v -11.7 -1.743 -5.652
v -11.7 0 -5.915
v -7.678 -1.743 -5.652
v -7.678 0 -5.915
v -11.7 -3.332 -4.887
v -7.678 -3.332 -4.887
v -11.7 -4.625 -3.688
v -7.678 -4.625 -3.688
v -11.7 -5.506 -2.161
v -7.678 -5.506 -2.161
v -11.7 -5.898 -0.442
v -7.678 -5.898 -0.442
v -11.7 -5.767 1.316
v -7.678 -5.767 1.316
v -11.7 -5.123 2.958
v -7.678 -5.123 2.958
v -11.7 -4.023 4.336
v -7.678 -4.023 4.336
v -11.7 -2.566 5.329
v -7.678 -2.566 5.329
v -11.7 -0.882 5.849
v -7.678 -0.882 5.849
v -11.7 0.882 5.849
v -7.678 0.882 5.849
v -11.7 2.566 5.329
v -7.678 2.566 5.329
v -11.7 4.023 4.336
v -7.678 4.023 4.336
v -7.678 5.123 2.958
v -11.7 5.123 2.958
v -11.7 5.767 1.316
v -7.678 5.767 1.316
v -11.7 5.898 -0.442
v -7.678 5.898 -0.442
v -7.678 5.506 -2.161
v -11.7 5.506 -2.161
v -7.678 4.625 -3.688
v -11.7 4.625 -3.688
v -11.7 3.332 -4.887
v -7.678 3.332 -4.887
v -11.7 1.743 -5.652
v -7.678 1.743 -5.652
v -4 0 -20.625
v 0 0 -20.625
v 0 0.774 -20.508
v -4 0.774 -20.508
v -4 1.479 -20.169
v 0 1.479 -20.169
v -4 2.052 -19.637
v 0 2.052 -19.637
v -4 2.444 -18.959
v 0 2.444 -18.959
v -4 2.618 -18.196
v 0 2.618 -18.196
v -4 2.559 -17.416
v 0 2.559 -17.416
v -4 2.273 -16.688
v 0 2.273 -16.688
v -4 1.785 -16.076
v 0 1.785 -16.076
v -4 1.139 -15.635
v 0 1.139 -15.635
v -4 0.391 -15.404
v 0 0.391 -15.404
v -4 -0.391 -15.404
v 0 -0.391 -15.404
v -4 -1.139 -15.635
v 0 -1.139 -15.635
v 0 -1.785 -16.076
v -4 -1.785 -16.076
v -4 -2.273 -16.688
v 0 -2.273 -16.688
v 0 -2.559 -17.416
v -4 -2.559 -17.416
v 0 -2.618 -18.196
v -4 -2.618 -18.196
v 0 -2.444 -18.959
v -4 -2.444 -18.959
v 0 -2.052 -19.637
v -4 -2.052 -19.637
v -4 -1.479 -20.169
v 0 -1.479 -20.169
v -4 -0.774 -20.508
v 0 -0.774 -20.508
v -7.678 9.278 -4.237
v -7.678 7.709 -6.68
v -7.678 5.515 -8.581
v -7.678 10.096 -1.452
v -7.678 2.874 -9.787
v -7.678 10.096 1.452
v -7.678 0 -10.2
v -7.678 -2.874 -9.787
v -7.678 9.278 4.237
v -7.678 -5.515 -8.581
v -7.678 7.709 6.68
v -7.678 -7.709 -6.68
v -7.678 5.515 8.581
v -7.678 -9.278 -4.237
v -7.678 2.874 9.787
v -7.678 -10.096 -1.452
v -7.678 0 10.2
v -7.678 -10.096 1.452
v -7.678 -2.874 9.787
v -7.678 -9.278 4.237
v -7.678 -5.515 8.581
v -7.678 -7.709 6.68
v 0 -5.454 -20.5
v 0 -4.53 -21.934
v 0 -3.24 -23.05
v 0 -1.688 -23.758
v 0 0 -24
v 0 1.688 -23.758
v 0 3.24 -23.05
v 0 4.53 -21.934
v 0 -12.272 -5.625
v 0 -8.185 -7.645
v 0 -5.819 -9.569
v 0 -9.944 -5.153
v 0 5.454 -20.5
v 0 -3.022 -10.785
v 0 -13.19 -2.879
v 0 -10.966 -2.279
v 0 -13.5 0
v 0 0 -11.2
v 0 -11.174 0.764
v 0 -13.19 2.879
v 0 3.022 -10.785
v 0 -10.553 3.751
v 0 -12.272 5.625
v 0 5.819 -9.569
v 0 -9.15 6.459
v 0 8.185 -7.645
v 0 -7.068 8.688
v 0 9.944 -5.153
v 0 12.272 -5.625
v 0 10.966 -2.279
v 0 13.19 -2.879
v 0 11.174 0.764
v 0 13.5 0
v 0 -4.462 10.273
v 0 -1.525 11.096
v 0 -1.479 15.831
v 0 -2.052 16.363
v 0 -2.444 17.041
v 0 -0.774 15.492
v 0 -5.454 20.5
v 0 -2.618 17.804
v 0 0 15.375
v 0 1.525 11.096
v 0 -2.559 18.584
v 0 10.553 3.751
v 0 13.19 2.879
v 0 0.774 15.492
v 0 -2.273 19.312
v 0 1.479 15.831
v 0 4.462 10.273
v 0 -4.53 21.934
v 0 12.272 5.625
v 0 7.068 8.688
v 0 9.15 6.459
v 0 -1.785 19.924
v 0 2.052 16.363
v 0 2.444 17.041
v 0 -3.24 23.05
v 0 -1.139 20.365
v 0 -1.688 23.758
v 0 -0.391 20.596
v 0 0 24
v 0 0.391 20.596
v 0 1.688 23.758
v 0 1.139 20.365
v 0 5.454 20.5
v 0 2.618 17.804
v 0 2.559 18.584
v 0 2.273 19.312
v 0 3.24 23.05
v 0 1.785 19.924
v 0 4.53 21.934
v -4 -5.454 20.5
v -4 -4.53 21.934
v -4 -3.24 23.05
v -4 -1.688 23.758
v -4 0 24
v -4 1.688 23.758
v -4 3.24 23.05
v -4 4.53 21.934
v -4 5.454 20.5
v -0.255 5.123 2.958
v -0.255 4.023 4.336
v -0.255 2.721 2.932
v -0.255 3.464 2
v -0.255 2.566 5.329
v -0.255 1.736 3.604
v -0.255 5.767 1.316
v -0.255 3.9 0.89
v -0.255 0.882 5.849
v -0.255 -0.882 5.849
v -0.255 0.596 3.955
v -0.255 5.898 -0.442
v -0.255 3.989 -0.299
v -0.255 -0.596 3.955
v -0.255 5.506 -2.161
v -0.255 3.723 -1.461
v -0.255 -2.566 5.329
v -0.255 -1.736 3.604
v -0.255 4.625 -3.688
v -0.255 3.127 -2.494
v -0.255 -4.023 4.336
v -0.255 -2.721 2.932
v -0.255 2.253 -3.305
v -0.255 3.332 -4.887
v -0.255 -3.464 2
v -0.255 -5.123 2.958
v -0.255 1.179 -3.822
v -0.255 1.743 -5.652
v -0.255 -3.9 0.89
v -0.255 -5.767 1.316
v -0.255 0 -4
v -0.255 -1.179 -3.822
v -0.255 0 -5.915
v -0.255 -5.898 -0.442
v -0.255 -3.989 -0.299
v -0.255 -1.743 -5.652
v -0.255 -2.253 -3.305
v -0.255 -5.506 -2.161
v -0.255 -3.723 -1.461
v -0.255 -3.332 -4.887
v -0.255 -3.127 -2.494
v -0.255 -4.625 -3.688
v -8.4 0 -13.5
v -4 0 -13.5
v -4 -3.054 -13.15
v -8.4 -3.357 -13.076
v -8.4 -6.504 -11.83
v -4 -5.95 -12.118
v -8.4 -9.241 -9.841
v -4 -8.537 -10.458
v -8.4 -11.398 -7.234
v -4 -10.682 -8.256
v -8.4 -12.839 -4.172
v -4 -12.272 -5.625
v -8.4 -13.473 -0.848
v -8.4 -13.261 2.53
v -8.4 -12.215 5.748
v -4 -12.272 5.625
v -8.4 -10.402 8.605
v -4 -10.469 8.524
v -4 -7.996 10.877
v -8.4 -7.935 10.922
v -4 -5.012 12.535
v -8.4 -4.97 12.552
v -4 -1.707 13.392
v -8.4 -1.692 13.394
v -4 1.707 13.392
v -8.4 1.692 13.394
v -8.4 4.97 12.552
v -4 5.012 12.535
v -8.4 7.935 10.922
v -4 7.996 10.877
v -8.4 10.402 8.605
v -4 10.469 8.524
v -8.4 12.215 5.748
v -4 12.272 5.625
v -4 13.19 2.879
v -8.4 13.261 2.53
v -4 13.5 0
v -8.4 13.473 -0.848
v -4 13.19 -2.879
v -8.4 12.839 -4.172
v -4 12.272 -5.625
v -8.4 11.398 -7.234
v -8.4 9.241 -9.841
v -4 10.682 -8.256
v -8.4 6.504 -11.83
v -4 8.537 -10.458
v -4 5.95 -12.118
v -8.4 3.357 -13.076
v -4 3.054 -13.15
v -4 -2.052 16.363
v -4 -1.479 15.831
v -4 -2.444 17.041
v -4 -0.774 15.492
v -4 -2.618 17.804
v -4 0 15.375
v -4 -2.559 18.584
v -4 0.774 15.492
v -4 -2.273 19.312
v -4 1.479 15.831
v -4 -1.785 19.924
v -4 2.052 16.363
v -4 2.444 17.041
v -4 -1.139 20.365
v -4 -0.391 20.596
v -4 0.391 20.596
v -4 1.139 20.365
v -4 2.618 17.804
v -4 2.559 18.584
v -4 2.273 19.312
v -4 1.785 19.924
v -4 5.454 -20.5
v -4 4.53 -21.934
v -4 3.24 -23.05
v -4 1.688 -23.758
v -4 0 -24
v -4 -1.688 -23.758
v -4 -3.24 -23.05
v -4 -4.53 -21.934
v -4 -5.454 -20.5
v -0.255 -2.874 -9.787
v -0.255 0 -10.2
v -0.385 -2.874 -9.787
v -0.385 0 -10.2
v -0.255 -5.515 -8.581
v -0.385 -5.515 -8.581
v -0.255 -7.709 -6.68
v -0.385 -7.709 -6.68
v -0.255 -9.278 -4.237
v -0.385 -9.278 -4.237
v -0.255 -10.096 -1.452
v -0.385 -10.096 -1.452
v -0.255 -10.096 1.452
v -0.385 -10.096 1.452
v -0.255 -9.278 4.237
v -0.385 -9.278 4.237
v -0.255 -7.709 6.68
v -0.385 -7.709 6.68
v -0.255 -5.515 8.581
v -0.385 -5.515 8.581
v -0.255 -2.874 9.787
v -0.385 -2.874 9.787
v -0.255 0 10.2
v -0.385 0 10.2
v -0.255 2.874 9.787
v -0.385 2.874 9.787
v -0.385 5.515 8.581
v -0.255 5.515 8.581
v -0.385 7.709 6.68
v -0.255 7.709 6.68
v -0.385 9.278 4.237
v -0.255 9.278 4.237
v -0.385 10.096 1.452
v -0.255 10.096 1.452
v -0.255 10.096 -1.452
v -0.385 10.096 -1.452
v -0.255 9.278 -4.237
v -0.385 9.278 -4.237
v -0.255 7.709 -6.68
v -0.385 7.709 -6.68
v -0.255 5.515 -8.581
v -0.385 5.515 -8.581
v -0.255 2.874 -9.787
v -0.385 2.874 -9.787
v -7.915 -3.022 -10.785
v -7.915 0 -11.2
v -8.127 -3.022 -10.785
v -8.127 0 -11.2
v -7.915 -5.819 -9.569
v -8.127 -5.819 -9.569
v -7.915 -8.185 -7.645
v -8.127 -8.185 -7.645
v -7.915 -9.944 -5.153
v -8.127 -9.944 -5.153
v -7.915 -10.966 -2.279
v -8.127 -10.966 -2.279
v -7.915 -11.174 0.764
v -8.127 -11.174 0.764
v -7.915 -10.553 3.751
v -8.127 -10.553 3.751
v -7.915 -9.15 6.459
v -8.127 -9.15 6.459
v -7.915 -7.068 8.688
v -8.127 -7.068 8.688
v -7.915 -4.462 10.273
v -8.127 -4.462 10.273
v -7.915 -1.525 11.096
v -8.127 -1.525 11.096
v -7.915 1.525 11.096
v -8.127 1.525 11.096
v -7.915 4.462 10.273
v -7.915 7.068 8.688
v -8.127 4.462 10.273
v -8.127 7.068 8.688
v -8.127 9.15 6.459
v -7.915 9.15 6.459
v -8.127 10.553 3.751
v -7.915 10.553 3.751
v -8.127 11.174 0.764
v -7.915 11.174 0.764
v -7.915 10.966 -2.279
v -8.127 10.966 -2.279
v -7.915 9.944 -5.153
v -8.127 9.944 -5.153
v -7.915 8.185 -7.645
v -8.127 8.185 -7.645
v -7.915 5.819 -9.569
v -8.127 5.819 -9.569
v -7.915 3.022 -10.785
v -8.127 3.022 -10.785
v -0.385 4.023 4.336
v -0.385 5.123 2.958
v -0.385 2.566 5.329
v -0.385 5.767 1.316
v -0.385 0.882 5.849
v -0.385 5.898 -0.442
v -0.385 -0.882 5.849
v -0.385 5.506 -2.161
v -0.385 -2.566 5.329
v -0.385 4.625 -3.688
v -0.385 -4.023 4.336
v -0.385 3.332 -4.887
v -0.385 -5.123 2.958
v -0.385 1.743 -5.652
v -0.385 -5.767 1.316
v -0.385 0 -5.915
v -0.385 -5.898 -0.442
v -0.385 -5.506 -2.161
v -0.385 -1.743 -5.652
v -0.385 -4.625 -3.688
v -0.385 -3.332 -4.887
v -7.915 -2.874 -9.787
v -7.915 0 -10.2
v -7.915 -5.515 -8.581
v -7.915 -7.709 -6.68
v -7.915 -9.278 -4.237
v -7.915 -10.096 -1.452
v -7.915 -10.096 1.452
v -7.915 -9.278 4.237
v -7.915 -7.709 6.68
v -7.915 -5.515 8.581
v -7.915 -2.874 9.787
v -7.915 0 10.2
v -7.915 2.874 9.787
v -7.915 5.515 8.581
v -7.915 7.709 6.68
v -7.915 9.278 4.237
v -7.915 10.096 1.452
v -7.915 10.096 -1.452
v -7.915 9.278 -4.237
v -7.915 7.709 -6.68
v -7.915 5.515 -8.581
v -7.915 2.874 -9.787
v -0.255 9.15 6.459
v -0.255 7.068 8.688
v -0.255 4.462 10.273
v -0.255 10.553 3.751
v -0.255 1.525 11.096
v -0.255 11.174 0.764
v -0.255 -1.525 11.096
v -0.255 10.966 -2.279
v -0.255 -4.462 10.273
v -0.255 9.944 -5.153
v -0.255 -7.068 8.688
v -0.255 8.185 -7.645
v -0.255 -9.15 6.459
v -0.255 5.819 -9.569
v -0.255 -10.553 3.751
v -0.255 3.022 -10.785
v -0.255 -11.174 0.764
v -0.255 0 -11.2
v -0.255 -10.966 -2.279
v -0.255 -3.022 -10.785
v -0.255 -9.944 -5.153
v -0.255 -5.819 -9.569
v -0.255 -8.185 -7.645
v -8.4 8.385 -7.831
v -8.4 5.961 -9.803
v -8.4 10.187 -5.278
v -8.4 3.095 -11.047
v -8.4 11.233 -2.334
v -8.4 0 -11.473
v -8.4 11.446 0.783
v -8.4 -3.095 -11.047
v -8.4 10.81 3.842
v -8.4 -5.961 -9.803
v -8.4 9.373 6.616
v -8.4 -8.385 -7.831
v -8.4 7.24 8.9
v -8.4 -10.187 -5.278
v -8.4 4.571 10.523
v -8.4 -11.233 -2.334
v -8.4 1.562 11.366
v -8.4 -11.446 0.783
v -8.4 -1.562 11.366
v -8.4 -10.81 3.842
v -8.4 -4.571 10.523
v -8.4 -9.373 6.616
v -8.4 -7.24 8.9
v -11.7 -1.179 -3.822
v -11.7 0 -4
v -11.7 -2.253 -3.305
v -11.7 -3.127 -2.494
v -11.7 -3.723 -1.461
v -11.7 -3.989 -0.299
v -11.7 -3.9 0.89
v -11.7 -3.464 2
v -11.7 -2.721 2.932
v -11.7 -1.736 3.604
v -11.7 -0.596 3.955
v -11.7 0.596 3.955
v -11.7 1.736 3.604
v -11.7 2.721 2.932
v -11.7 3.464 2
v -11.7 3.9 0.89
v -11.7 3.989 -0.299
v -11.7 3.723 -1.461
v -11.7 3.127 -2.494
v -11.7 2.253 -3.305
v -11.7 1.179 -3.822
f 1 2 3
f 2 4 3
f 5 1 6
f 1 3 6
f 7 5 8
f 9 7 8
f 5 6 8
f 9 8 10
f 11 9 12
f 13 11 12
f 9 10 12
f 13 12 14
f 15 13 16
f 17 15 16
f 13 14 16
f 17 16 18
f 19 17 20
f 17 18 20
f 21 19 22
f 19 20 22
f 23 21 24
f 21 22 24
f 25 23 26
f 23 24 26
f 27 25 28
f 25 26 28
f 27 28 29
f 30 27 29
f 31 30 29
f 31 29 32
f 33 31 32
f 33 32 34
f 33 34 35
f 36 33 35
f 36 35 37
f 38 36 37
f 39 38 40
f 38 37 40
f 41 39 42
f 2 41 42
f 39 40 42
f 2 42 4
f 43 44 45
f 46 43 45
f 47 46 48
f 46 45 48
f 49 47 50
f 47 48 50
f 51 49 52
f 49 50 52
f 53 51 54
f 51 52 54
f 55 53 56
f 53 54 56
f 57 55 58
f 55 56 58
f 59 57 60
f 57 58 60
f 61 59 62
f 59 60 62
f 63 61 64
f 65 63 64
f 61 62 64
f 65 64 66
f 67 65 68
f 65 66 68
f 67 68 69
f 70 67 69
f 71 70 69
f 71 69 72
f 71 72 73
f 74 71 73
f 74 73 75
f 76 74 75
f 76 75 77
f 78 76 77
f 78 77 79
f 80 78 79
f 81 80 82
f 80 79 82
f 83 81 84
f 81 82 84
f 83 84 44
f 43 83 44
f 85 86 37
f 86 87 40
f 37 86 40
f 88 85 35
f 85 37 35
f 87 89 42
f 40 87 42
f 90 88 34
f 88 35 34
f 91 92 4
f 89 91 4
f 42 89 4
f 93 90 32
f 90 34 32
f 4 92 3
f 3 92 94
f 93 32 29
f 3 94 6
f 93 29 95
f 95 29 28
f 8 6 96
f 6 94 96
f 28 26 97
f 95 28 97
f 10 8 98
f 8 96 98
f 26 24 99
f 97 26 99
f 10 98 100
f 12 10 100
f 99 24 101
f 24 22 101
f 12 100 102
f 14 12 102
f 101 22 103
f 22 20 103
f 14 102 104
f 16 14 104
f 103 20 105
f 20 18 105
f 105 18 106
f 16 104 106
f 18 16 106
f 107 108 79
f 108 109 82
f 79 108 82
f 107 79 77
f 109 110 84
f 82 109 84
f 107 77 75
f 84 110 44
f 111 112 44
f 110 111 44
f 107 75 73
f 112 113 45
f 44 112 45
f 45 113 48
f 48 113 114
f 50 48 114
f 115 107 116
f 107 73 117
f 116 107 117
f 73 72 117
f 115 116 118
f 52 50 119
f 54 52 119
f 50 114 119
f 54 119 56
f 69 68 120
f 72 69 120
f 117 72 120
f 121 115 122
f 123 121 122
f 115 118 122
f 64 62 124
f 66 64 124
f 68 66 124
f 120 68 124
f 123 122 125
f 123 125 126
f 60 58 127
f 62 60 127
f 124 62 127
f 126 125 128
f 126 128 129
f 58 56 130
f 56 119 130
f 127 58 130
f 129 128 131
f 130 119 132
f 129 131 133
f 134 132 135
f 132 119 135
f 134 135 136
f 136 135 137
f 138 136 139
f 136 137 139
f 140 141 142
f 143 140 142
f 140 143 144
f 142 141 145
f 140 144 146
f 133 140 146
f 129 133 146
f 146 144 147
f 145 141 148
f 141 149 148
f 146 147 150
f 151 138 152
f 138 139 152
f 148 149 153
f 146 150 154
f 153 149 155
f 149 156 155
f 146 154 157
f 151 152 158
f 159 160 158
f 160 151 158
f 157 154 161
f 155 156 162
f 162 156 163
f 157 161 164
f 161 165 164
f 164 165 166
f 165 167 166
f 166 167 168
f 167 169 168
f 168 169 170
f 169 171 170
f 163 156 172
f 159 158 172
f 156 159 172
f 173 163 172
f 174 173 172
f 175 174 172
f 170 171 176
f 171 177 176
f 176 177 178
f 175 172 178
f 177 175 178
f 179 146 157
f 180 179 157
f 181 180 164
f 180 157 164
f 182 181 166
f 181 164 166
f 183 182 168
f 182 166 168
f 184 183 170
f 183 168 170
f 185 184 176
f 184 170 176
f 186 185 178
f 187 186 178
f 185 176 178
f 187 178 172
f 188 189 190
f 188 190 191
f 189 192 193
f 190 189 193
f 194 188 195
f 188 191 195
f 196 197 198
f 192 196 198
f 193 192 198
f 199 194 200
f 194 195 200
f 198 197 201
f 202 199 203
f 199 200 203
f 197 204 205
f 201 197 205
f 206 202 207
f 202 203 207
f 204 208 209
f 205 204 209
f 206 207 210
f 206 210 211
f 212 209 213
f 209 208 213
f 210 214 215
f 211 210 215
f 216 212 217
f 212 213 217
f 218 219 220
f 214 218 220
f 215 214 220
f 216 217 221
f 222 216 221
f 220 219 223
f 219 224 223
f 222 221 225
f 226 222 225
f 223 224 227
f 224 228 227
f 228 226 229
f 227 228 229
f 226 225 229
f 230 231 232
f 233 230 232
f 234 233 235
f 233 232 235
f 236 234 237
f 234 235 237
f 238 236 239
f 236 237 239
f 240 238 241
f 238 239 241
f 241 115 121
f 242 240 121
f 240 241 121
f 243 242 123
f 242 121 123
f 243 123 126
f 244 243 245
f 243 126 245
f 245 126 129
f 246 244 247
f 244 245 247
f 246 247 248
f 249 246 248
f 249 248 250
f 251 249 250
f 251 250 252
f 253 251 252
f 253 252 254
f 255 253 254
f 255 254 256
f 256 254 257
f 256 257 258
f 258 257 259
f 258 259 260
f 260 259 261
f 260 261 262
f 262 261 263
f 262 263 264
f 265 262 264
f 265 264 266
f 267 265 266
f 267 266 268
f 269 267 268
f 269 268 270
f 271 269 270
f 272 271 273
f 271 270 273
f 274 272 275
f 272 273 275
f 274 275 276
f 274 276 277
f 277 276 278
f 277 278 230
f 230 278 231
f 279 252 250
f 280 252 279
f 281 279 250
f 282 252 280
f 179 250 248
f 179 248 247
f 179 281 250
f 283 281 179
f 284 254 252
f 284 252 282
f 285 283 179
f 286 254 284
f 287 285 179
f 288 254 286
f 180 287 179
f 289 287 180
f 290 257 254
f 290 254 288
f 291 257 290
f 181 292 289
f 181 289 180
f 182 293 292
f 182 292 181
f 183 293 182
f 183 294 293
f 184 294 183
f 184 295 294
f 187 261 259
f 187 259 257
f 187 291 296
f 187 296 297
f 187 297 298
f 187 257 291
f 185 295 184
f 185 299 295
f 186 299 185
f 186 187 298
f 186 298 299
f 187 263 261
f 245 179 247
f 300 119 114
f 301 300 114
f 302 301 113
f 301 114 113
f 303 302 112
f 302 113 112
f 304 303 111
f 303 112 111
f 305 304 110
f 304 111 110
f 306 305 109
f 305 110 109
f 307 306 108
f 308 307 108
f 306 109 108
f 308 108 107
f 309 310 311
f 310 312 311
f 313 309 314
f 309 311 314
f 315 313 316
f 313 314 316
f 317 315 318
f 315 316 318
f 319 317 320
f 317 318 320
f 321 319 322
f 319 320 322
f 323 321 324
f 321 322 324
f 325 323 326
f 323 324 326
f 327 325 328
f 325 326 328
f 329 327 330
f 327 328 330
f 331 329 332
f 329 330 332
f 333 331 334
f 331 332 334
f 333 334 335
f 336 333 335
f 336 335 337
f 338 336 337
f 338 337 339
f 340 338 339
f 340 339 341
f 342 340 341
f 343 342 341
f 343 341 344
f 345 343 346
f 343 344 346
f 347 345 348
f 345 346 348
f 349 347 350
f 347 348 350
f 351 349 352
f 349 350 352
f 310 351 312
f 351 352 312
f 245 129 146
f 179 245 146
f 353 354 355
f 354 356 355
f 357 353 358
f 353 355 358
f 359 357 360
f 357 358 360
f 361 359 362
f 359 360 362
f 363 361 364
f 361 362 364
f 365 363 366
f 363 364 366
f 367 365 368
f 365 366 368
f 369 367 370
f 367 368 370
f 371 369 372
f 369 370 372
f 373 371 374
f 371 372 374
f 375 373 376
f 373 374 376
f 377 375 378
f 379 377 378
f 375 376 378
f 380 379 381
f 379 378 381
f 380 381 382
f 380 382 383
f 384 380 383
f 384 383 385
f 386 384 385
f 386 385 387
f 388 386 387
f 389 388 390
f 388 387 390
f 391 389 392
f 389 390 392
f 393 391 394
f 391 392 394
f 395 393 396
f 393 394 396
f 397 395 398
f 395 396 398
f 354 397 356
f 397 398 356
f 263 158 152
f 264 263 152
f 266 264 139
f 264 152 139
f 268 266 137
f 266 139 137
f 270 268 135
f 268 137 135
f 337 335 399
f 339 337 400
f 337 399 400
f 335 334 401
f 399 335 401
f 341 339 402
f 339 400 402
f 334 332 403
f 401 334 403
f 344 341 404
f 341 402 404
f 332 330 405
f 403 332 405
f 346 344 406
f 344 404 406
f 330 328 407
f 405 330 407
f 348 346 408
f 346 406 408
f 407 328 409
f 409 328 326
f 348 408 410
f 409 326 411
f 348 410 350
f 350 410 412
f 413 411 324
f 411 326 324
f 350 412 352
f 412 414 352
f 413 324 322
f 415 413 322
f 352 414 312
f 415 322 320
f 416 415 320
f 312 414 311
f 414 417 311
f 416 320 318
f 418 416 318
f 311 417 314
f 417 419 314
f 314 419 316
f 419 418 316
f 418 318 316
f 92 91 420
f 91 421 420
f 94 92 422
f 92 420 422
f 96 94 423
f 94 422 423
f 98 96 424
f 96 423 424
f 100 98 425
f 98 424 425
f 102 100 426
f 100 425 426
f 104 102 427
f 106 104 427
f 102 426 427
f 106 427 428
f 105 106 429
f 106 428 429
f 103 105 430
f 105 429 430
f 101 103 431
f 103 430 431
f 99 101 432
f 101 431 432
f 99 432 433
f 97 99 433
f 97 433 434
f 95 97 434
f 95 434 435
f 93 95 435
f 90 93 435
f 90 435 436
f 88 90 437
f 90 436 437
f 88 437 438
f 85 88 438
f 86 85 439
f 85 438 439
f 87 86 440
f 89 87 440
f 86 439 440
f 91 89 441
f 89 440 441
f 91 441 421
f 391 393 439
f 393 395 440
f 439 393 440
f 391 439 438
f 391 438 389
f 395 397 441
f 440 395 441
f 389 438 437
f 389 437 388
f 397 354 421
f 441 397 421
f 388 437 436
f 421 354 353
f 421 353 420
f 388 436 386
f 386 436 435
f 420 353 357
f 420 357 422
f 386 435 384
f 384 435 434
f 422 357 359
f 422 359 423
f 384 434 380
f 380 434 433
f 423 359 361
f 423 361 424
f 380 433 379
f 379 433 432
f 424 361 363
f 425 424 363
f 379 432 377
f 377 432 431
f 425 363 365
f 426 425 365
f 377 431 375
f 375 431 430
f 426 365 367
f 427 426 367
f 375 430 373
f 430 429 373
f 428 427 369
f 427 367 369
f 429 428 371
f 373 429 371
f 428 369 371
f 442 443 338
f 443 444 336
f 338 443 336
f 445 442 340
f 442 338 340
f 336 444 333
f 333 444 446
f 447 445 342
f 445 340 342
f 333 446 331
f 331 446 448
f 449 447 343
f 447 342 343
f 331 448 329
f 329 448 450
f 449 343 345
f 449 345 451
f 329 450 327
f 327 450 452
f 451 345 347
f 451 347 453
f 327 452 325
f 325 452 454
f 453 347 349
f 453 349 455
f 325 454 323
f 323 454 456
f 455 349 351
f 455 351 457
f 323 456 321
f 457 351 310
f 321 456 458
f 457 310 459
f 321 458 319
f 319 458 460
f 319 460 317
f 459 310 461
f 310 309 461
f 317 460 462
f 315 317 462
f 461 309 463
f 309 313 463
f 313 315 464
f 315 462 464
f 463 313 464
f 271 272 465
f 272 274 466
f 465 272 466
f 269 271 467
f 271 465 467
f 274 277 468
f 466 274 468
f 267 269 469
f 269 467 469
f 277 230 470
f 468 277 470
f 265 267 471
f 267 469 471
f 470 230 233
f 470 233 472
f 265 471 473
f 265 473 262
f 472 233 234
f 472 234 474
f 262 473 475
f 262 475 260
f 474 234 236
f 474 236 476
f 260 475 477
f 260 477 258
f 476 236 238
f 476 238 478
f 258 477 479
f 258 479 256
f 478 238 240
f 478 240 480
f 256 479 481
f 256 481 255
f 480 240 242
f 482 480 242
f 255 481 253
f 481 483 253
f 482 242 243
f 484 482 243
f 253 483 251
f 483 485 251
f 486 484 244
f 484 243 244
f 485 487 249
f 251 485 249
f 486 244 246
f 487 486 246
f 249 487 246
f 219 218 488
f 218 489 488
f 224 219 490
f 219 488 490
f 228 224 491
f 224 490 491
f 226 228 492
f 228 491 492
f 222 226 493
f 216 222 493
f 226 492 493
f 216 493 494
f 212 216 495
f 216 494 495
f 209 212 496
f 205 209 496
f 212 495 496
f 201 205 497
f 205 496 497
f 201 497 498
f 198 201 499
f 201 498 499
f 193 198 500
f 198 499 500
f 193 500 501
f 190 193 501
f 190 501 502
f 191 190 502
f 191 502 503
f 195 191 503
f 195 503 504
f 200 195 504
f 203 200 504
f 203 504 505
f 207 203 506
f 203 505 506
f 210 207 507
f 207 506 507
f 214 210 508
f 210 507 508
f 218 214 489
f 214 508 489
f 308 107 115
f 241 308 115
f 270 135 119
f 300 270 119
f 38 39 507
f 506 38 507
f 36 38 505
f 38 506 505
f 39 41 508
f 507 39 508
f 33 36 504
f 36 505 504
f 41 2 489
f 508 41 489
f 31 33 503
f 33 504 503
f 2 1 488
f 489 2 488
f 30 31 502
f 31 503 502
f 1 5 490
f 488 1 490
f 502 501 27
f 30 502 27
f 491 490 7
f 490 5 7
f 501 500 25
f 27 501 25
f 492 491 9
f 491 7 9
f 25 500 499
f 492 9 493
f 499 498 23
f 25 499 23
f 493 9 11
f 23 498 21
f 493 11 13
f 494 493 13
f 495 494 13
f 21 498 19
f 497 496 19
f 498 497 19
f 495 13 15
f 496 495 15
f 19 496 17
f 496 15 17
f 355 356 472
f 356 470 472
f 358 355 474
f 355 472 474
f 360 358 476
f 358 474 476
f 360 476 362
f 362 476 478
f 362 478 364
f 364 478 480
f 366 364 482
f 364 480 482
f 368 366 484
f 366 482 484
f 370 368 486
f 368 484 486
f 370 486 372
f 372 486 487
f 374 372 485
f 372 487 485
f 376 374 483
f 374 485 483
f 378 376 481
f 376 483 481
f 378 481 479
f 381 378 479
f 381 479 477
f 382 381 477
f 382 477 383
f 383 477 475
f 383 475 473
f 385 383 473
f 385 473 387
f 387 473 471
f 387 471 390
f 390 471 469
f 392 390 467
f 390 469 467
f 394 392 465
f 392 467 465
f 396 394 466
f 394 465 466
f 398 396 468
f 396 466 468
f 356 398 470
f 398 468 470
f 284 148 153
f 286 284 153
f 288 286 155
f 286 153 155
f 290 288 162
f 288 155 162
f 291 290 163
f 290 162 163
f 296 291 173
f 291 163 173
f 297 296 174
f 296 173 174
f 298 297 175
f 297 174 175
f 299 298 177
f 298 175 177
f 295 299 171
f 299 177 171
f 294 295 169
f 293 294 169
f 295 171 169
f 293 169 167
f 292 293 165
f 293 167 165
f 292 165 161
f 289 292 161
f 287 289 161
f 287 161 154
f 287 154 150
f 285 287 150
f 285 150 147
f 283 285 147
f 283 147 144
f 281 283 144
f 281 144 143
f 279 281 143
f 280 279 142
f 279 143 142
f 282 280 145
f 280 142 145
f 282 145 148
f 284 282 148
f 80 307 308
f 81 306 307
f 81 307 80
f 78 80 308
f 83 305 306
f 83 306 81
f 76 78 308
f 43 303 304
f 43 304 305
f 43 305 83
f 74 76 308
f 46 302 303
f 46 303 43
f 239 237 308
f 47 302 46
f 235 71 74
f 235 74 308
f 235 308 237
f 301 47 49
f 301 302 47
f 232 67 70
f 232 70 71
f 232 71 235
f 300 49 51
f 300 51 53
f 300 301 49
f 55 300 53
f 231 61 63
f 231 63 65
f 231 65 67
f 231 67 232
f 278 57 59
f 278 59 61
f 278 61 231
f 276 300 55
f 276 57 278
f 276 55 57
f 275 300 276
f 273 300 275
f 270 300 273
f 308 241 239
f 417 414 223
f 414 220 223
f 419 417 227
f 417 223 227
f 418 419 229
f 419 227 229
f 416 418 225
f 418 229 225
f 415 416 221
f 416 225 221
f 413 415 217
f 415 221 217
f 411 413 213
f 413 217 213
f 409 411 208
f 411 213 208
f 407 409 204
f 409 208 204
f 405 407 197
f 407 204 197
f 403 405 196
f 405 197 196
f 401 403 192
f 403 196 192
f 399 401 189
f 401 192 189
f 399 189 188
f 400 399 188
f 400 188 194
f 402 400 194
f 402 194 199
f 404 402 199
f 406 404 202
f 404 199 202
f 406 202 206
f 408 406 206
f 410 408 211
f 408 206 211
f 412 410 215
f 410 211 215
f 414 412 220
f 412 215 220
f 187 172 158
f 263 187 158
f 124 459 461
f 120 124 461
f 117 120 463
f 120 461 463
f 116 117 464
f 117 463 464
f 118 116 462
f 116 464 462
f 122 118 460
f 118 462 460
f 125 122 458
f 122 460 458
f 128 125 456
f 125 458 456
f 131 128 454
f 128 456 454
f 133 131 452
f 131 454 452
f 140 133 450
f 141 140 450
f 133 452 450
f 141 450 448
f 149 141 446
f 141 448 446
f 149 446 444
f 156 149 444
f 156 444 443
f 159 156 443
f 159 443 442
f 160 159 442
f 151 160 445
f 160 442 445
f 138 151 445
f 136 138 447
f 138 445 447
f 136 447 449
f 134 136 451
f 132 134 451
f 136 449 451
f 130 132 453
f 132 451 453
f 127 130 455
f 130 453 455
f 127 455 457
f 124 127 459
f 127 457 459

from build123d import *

# Parameters (mm, degrees)
SKETCH4_R           = 11.2
SKETCH4_R_2         = 2.625
BOSS_EXTRUDE3_DEPTH = 4


with BuildPart() as part:
    # Sketch2 → Revolve1 (revolve)
    with BuildSketch(Plane(origin=(0, 0, 0), x_dir=(1, 0, 0), z_dir=(0, 1, 0))):
        Polygon((-0.255431619, 4), (-11.7, 4), (-11.7, 5.915), (-7.678354549, 5.915), (-7.678354549, 10.2), (-7.915390692, 10.2), (-7.915390692, 11.2), (-8.1271402, 11.2), (-8.4, 11.4728598), (-8.4, 13.5), (0, 13.5), (0, 11.2), (-0.255431619, 11.2), (-0.255431619, 10.2), (-0.384561477, 10.2), (-0.384561477, 5.915), (-0.255431619, 5.915), align=None)
    revolve(axis=Axis((0, 0, 0), (-1, 0, 0)))

    # Sketch4 → Boss-Extrude3 (add)
    with BuildSketch(Plane(origin=(0, 0, 0), x_dir=(0, 0, -1), z_dir=(1, 0, 0))):
        with BuildLine():
            ThreePointArc((20.5, 5.454356057), (24, 0), (20.5, -5.454356057))
            Line((20.5, -5.454356057), (5.625, -12.272301129))
            ThreePointArc((5.625, -12.272301129), (0, -13.5), (-5.625, -12.272301129))
            Line((-5.625, -12.272301129), (-20.5, -5.454356057))
            ThreePointArc((-20.5, -5.454356057), (-24, 0), (-20.5, 5.454356057))
            Line((-20.5, 5.454356057), (-5.625, 12.272301129))
            ThreePointArc((-5.625, 12.272301129), (0, 13.5), (5.625, 12.272301129))
            Line((5.625, 12.272301129), (20.5, 5.454356057))
        make_face()
        Circle(SKETCH4_R, mode=Mode.SUBTRACT)
        with Locations((-18, 0)):
            Circle(SKETCH4_R_2, mode=Mode.SUBTRACT)
        with Locations((18, 0)):
            Circle(SKETCH4_R_2, mode=Mode.SUBTRACT)
    extrude(amount=-BOSS_EXTRUDE3_DEPTH)


solid = part.part
